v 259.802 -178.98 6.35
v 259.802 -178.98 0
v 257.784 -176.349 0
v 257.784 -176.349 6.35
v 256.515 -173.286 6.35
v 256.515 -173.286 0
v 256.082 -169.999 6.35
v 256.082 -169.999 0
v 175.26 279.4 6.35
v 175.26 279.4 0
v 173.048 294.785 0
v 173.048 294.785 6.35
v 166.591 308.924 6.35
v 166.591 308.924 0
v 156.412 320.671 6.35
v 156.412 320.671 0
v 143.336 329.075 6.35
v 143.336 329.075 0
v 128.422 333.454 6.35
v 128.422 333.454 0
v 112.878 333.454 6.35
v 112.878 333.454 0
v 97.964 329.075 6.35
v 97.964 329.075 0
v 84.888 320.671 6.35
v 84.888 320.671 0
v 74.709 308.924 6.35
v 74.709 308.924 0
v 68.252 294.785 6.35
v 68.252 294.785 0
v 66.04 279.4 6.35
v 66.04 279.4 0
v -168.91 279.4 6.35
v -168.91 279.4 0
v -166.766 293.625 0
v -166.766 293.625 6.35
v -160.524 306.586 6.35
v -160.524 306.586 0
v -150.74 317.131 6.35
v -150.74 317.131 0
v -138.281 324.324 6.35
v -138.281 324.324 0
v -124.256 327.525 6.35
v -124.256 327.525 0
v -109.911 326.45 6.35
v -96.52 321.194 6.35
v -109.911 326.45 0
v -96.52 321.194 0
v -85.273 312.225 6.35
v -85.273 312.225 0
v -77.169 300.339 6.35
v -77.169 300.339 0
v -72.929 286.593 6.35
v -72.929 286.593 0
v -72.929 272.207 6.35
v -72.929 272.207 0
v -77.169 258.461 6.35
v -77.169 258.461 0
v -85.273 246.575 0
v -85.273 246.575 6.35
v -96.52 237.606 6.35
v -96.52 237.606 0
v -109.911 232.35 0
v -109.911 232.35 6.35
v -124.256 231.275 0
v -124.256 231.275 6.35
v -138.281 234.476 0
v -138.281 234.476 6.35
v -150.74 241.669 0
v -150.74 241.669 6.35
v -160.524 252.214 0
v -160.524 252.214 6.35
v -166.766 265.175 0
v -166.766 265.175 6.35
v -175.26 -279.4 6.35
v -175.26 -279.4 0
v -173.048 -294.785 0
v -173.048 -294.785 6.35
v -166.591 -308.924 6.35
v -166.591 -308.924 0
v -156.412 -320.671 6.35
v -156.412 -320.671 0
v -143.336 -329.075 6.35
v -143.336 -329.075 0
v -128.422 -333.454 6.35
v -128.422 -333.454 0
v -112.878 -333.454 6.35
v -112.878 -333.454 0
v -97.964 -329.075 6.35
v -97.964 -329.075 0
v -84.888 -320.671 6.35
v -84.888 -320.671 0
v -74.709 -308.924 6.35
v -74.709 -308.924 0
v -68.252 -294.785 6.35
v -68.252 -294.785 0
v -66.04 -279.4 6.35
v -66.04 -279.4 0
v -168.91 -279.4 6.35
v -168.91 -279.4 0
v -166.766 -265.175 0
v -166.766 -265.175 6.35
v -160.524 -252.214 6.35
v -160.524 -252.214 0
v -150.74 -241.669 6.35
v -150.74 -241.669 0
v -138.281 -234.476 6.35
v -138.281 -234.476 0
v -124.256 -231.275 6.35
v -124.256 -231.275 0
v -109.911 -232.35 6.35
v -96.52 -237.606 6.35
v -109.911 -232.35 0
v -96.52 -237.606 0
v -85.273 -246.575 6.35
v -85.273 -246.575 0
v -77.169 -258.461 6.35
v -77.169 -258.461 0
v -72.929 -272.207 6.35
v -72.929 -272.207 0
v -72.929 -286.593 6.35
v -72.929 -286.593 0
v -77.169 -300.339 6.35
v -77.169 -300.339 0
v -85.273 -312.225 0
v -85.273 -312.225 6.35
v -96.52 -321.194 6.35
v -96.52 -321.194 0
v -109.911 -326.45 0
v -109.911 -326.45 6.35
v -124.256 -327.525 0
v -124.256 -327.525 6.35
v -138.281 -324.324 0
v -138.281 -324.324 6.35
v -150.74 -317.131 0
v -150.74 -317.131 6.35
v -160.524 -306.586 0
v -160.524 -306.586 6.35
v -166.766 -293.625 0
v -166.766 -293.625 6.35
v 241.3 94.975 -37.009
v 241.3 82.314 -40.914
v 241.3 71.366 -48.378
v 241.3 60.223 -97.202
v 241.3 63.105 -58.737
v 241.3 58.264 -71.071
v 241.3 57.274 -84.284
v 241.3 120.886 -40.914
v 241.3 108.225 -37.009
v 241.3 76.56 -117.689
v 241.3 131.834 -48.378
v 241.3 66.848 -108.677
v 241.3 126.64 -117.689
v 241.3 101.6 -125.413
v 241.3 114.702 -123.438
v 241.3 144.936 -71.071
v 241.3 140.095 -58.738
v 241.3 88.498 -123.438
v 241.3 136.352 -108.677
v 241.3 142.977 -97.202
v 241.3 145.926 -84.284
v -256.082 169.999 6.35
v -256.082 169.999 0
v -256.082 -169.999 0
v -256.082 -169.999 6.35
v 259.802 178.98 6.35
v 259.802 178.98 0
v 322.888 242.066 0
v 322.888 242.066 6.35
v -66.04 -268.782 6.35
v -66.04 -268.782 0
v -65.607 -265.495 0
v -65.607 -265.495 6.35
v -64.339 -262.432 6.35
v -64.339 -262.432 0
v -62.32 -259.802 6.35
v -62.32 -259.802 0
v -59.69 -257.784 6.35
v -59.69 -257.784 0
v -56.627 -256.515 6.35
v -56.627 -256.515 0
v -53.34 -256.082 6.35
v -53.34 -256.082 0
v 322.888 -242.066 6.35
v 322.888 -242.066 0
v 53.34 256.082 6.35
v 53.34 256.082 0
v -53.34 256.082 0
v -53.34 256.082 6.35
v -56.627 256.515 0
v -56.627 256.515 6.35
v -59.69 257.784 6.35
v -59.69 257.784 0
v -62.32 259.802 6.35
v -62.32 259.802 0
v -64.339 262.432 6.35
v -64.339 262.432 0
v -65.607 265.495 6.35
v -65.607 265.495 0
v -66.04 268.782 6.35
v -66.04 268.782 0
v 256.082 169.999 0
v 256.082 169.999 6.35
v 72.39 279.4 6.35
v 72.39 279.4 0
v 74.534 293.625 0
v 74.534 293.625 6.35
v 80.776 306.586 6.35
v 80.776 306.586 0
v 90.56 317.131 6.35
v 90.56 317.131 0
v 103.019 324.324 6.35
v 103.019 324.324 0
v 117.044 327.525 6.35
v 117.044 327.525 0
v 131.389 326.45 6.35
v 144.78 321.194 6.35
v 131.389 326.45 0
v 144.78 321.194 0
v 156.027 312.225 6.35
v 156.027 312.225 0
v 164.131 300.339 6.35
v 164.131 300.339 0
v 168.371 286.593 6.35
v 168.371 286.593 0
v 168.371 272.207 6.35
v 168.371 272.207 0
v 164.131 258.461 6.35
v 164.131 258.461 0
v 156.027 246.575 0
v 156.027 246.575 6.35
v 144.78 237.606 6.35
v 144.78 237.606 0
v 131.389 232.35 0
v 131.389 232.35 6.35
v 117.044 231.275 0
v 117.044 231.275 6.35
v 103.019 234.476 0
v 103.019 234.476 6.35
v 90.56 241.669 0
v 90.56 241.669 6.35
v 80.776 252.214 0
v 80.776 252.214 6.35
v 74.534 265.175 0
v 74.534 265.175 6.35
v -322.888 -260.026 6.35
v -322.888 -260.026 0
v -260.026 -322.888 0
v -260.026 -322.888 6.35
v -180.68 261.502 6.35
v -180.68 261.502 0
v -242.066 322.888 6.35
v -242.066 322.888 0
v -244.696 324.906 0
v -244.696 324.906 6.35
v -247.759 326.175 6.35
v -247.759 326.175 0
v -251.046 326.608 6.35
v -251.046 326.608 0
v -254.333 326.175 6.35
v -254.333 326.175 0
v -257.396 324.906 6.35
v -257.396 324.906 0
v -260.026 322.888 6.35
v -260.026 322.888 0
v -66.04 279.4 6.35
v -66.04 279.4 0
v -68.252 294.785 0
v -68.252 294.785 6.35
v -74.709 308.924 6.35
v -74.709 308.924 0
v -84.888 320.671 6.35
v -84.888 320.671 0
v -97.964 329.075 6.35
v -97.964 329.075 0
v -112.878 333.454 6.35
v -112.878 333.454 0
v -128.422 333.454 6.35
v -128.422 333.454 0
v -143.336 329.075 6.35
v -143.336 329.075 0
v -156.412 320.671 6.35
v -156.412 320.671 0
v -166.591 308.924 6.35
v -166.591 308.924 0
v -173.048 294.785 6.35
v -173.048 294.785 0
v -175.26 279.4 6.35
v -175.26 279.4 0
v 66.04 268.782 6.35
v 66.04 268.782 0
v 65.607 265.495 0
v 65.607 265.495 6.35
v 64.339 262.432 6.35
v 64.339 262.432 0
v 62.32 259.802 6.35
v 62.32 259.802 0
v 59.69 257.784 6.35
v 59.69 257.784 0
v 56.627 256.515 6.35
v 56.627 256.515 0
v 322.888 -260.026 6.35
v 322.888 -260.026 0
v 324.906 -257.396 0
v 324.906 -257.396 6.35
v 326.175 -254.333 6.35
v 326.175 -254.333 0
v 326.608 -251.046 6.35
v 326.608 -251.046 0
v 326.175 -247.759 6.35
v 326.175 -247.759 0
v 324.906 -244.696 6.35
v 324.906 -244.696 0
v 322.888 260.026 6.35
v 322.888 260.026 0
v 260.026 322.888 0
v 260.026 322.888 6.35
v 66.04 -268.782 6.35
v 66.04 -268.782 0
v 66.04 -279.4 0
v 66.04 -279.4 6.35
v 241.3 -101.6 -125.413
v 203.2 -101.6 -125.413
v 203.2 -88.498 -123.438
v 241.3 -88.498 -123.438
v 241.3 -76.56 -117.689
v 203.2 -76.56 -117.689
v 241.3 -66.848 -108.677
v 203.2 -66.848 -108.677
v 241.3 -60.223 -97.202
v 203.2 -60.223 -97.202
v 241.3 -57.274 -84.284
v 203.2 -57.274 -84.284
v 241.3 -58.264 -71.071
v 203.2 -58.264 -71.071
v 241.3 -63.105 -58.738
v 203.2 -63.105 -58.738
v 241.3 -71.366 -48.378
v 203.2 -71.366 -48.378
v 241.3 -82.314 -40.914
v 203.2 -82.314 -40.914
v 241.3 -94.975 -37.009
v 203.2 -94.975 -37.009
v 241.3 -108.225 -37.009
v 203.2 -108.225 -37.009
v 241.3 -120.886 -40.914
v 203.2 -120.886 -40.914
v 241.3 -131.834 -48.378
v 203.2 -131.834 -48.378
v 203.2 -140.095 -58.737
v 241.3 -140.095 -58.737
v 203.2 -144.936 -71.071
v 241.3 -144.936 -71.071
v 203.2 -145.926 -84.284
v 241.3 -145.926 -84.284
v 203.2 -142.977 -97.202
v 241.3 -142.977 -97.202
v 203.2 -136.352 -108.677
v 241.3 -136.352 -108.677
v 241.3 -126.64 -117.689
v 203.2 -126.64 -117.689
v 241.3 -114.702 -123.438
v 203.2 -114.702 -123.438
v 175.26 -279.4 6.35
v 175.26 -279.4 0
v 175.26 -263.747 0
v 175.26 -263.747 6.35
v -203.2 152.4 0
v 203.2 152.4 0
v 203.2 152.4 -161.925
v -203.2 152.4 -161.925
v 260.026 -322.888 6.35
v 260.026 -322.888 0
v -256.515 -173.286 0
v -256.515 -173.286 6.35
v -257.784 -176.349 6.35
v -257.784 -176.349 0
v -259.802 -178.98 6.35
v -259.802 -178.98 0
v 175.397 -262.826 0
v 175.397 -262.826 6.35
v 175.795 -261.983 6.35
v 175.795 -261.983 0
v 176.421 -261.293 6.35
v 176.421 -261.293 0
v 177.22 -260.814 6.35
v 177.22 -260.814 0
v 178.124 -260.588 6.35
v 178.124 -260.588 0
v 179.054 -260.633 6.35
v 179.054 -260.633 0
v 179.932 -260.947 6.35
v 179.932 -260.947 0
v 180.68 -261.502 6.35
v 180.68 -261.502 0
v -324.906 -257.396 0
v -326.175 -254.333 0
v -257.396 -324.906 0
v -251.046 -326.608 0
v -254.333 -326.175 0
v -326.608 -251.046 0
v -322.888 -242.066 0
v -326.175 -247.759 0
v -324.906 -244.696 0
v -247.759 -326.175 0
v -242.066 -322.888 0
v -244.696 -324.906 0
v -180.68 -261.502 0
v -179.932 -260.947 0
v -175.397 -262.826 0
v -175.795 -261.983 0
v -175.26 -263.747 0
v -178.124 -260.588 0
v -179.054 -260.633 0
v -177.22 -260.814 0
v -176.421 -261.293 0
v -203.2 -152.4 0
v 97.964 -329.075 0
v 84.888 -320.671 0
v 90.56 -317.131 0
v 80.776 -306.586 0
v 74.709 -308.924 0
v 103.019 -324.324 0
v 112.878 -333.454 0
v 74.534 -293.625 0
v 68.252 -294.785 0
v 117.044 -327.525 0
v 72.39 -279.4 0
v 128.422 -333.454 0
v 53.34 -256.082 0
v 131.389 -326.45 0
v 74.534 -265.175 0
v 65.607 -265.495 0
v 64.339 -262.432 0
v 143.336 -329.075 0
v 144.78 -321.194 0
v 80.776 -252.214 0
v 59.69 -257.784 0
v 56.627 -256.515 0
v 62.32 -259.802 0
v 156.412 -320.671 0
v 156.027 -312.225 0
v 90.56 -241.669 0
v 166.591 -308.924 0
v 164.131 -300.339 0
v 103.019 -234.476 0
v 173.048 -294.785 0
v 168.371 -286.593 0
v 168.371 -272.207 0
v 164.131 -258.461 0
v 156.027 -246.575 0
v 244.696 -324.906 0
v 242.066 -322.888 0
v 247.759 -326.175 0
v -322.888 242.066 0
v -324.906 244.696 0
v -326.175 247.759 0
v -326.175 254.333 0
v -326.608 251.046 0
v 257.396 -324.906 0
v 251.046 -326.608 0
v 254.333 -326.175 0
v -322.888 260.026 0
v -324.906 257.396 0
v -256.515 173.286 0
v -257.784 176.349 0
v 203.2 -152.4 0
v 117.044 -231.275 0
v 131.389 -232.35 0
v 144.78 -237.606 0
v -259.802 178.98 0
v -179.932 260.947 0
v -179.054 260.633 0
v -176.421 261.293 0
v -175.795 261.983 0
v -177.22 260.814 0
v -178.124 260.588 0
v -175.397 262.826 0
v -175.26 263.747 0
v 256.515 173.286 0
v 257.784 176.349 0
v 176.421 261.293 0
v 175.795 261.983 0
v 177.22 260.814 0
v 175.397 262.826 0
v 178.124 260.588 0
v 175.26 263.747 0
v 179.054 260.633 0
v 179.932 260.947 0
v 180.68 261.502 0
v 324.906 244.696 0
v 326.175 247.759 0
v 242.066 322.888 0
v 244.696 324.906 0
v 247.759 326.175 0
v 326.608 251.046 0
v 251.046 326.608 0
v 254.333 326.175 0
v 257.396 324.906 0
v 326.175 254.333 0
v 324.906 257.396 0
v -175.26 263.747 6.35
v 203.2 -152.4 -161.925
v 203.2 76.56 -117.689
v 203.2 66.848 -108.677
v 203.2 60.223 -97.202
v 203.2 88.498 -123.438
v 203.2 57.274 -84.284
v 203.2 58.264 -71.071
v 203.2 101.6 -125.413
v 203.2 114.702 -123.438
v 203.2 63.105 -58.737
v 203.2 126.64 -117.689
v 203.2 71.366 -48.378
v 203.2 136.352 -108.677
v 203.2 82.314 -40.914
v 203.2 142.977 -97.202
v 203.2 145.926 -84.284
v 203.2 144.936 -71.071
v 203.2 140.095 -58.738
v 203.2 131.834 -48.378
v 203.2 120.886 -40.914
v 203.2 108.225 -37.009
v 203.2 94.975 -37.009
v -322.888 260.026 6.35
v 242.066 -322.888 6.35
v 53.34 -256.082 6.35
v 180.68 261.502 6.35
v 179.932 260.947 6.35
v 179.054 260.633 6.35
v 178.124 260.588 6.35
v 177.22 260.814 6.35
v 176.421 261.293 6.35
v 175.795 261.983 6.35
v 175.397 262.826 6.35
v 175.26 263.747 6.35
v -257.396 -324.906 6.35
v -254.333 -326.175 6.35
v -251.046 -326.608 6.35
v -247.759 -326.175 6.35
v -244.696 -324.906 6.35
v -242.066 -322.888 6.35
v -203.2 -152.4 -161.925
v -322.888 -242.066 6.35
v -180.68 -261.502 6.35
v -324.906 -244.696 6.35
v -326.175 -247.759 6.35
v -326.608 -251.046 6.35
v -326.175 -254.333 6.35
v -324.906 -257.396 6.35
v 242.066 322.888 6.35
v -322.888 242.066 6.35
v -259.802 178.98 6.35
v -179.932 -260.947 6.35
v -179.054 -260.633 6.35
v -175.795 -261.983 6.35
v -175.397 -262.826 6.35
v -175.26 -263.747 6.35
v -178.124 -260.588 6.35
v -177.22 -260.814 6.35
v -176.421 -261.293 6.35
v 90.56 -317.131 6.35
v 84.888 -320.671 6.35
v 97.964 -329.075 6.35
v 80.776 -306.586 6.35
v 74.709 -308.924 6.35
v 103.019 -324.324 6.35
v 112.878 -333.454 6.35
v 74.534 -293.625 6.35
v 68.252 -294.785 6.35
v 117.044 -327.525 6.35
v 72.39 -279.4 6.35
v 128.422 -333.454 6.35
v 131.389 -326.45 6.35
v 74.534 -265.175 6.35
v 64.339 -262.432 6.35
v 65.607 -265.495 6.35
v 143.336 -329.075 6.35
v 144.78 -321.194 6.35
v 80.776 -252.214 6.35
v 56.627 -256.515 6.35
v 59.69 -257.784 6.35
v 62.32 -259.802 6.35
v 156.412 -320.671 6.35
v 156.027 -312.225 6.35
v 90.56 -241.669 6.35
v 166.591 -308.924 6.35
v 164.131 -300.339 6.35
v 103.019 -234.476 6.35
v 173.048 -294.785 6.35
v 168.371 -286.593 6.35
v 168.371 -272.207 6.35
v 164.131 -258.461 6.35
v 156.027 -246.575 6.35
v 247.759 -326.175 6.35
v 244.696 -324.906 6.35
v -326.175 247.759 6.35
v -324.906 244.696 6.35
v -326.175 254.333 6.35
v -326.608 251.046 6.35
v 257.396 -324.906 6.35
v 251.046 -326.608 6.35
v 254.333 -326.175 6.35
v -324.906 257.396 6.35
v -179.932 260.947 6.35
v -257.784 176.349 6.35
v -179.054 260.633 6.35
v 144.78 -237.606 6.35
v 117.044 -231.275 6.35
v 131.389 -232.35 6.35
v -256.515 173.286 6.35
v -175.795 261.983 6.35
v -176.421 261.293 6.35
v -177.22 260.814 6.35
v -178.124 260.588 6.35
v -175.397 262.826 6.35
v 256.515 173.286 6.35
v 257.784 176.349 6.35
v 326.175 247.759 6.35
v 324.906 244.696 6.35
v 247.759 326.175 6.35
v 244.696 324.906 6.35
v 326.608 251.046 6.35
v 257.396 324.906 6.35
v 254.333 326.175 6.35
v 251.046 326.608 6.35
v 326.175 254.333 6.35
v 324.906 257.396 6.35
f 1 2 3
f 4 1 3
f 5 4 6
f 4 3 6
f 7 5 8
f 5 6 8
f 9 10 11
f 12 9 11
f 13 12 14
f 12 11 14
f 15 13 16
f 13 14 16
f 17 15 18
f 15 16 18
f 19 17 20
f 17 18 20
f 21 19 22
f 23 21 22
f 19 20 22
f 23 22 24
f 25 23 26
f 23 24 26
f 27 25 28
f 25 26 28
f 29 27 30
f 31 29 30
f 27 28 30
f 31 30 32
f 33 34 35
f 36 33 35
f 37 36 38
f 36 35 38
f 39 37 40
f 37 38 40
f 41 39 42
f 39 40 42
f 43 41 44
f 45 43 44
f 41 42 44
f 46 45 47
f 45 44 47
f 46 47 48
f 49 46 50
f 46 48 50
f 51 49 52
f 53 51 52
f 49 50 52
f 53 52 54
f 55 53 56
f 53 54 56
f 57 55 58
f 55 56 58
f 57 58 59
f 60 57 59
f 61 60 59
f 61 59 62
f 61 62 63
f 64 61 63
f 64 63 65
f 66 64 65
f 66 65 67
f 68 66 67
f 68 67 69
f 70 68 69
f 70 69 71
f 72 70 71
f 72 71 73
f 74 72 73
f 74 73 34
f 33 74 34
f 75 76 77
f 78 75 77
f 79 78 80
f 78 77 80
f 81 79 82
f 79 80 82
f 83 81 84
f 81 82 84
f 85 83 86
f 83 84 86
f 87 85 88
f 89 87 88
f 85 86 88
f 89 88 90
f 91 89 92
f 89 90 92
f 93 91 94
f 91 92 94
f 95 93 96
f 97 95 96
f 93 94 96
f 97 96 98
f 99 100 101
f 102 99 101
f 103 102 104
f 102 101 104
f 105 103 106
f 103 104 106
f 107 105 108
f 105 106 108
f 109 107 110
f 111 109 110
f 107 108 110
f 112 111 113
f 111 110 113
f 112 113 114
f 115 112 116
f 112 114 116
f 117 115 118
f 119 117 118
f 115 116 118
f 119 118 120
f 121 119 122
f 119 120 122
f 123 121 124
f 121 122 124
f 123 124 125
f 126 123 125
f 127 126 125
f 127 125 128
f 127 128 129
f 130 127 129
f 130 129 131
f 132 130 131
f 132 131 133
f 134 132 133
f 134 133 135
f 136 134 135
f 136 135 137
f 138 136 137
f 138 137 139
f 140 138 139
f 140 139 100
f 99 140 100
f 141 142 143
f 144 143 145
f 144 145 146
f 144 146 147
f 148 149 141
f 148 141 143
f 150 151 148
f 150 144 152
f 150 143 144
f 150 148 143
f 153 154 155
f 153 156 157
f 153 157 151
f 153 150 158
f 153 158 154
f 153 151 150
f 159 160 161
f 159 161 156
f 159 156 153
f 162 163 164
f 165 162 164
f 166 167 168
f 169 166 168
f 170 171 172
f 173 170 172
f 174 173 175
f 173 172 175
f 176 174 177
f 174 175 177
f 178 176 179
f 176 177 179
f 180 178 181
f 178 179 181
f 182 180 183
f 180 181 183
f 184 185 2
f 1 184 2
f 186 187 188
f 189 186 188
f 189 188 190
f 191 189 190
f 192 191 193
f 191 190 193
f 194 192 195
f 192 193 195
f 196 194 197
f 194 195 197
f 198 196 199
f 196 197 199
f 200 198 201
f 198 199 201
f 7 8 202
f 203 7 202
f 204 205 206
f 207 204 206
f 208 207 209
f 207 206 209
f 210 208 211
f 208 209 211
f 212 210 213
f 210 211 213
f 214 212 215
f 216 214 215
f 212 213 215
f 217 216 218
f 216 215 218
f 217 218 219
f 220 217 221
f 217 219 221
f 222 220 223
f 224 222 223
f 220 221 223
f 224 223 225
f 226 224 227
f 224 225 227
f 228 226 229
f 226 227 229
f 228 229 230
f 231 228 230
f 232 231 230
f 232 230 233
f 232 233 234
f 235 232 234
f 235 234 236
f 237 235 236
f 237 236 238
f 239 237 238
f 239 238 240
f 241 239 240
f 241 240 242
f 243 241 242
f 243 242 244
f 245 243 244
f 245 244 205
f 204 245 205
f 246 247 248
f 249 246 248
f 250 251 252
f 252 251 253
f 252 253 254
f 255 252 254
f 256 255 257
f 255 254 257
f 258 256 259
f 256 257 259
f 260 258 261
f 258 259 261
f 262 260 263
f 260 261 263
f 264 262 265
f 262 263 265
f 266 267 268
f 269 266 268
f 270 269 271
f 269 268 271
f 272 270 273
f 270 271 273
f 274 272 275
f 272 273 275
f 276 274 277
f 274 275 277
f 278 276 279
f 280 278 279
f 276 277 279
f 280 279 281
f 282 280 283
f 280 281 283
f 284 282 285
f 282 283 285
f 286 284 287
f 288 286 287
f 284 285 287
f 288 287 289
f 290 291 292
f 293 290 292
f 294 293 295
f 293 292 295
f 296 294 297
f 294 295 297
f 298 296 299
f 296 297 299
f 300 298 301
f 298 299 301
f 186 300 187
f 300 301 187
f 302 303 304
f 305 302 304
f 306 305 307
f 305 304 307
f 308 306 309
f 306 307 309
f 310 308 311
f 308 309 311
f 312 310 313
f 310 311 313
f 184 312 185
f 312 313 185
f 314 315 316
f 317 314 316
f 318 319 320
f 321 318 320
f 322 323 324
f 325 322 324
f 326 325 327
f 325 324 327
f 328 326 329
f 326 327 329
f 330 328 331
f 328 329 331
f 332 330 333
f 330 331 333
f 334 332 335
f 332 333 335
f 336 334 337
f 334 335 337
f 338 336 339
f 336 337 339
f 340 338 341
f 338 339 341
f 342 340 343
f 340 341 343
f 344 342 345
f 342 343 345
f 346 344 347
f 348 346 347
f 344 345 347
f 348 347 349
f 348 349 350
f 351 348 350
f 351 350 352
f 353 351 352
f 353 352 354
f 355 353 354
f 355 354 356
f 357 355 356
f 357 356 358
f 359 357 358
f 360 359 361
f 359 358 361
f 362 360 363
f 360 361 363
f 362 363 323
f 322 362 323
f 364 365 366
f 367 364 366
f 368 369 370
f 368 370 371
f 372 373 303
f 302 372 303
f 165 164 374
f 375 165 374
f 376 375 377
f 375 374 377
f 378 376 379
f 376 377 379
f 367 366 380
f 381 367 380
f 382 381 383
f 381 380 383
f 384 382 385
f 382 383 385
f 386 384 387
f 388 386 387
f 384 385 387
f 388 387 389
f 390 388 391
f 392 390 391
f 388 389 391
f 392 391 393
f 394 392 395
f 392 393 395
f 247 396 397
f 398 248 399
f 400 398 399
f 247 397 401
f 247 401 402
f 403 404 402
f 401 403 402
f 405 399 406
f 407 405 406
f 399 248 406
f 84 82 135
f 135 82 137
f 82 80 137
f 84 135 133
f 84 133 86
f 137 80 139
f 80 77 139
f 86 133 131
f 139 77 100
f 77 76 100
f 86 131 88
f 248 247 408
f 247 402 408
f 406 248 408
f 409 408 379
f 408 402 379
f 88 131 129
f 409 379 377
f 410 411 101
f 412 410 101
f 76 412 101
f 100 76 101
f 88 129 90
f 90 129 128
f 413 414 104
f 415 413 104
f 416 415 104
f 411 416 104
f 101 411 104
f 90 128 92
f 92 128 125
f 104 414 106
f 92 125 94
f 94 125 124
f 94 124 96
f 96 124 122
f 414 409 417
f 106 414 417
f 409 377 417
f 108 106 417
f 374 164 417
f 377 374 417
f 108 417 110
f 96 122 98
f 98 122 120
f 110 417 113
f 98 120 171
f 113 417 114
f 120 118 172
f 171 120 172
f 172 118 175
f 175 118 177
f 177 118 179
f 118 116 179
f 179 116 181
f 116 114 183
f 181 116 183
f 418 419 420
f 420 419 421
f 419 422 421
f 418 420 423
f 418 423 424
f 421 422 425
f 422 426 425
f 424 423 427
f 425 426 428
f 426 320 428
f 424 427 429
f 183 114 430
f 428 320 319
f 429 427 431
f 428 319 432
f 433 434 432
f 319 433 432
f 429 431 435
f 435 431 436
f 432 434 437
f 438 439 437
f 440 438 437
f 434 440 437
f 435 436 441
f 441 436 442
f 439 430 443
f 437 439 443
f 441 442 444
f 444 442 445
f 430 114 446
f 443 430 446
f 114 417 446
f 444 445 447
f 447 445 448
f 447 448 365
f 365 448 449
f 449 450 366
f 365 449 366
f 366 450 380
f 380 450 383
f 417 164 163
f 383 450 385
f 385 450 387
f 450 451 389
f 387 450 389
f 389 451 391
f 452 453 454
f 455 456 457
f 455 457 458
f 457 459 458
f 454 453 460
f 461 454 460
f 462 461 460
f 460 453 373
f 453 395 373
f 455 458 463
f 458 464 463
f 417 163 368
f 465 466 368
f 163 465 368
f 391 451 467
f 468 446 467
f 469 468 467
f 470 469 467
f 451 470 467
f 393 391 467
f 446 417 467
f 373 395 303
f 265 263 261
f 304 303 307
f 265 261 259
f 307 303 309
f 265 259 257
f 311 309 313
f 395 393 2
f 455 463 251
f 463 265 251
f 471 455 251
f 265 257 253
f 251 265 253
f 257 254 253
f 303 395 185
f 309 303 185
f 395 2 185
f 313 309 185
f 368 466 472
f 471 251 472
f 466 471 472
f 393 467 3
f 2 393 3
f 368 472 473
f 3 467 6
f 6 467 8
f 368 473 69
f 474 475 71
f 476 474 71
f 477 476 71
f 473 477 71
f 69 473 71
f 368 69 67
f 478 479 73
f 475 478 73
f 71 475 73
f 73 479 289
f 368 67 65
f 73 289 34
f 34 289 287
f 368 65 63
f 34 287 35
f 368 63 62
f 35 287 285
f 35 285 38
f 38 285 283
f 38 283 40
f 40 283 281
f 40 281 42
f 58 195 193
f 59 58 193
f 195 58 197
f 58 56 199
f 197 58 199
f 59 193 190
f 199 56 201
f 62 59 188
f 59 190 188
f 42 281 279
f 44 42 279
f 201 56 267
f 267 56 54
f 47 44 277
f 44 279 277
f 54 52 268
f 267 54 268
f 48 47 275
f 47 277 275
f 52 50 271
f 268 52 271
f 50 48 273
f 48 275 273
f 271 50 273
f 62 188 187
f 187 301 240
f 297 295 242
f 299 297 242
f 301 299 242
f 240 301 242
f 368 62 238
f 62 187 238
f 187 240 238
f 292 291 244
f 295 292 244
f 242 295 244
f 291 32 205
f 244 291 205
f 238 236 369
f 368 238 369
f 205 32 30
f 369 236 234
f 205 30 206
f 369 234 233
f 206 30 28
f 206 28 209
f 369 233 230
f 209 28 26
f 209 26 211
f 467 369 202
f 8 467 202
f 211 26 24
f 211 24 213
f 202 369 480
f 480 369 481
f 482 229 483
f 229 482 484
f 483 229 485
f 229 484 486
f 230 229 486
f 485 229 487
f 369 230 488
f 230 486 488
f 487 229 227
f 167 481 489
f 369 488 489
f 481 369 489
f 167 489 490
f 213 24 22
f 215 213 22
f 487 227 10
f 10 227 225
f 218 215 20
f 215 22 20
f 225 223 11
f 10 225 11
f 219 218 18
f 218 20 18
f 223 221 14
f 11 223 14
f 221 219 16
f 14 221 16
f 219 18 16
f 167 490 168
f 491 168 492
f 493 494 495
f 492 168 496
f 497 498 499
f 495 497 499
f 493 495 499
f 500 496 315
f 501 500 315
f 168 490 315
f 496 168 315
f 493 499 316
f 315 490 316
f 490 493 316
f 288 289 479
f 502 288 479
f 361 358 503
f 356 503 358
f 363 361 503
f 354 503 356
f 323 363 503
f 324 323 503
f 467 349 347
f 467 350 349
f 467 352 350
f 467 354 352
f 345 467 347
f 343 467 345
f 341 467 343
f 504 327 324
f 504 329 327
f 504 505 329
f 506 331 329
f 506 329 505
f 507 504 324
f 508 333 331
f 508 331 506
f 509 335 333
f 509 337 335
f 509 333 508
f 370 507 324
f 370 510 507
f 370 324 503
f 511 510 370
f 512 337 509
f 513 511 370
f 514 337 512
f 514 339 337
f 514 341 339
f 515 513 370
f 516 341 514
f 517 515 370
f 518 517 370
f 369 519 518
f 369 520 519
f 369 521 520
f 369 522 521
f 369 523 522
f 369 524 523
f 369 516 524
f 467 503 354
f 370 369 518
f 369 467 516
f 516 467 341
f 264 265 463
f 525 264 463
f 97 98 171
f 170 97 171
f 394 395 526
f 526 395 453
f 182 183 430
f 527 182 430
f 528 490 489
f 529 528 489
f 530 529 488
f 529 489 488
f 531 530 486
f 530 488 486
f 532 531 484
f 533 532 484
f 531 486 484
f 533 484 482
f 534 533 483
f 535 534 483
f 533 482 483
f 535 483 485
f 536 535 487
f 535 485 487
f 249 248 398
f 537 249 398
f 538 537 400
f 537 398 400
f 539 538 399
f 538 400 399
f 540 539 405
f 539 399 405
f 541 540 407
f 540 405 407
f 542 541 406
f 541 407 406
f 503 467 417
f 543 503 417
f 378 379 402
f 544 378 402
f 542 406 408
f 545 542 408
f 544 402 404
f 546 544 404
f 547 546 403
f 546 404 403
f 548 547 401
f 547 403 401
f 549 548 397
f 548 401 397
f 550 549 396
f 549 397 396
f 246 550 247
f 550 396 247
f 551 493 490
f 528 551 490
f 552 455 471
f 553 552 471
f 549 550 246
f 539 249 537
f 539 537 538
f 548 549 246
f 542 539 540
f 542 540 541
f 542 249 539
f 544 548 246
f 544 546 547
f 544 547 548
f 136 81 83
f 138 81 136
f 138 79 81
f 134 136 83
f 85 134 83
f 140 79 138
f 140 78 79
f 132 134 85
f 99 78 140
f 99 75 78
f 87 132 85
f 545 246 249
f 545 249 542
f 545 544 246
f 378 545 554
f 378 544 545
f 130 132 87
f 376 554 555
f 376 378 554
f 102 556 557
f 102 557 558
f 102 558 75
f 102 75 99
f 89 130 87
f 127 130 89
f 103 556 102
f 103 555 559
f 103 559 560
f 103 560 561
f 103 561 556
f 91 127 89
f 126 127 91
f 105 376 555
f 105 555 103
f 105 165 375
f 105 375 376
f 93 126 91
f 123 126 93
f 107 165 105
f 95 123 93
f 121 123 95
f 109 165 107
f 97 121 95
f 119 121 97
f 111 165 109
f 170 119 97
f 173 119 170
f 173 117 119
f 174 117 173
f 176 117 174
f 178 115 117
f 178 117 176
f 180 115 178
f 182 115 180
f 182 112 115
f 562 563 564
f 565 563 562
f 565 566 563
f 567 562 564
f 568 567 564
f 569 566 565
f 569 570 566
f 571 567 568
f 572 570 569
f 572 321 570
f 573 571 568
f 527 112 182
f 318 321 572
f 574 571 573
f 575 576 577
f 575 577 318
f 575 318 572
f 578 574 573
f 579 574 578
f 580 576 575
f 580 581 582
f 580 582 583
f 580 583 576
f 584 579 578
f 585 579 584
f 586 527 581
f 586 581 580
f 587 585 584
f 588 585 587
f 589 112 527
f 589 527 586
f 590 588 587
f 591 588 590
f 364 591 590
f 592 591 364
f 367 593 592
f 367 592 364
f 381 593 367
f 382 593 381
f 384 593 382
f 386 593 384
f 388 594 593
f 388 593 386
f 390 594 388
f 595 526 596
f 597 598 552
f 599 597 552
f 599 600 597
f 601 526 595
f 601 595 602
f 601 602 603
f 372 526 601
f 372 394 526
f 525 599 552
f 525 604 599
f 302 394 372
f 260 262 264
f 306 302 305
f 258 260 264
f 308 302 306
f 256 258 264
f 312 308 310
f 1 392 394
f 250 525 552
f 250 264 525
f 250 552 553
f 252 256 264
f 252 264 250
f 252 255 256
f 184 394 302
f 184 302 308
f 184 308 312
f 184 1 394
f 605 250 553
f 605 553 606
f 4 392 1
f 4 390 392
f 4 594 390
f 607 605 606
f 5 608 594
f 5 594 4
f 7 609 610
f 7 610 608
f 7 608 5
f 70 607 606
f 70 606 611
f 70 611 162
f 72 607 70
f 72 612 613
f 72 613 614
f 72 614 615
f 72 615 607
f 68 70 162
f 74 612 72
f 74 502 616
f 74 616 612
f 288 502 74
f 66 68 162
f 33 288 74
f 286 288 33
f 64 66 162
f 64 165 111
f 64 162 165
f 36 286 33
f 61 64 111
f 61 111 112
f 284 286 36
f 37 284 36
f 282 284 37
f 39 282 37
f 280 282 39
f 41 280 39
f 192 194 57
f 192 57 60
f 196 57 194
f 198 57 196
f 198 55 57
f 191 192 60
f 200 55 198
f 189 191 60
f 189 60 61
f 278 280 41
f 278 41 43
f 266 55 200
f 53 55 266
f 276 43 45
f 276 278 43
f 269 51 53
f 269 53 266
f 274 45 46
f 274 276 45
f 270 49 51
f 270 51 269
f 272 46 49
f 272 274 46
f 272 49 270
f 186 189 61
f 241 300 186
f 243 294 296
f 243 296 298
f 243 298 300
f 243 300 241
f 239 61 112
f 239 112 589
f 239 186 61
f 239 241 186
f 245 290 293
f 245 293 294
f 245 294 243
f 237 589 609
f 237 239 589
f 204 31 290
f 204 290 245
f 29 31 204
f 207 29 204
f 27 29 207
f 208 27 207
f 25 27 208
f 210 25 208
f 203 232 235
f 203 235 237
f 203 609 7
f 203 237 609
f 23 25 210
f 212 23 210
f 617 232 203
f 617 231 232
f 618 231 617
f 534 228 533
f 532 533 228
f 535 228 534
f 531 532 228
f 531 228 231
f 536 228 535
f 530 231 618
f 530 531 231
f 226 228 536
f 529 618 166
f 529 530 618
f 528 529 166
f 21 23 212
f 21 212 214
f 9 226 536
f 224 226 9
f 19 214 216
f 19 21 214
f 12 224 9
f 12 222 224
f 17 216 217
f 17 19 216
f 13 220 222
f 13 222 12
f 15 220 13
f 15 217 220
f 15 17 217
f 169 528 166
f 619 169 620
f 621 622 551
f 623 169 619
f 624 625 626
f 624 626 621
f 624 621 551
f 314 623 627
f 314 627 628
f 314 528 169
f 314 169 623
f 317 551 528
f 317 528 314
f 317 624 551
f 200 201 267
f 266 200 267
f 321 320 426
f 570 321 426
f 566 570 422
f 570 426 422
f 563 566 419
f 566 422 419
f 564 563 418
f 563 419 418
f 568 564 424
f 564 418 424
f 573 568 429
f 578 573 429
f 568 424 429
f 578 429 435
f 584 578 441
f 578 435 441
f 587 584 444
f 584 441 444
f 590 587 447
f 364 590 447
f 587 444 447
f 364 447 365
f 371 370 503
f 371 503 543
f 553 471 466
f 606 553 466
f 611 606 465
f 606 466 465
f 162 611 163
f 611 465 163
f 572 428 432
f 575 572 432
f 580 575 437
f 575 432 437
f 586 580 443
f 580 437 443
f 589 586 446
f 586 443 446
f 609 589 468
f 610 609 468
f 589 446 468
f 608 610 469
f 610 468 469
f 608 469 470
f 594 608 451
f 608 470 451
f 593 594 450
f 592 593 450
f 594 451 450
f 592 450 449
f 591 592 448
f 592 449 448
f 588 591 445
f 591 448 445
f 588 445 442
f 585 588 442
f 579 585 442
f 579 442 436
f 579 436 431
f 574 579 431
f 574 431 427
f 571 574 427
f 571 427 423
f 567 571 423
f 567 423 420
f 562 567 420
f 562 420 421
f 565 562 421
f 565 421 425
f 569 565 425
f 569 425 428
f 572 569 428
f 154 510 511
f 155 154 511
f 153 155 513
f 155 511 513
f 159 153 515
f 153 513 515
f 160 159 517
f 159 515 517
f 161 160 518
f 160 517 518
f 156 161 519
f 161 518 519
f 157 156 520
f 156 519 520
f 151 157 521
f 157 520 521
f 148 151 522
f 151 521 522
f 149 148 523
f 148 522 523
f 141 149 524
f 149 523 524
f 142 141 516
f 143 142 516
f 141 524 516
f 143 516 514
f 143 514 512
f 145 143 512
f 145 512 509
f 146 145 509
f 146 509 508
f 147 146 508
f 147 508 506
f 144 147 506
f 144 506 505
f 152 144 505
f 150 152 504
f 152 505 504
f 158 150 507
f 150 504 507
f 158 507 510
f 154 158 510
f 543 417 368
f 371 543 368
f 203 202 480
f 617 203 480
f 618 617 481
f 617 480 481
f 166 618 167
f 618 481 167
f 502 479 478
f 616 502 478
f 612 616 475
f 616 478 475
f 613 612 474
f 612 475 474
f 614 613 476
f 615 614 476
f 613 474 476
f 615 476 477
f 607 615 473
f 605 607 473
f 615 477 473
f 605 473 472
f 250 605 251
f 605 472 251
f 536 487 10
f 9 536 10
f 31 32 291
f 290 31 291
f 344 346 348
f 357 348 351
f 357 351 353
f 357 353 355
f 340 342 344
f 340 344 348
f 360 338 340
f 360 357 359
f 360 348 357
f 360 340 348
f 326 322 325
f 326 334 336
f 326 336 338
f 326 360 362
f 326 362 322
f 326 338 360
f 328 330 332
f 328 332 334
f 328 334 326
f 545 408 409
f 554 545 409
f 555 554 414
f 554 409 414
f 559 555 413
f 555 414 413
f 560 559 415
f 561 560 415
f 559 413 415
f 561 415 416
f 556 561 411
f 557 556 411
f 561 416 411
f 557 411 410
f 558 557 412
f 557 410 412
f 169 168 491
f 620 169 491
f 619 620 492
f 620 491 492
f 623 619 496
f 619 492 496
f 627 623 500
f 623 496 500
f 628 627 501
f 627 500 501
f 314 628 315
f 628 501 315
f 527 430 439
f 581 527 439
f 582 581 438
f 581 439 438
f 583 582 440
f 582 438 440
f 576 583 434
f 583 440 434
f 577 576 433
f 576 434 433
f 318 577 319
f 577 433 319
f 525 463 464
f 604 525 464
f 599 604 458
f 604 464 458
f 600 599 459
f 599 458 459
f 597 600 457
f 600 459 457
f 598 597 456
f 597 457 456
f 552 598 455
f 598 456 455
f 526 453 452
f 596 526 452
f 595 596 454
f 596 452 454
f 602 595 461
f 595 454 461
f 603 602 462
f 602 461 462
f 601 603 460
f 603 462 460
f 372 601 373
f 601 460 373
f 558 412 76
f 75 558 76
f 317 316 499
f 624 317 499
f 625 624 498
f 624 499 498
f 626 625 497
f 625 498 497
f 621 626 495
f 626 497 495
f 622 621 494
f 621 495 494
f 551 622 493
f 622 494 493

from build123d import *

# Parameters (mm, degrees)
BOSS_EXTRUDE1_DEPTH = 6.35
SKETCH2_W           = 406.4
SKETCH2_H           = 304.8
BOSS_EXTRUDE2_DEPTH = 161.925
SKETCH3_R           = 48.26
CUT_EXTRUDE1_DEPTH  = 161.925
SKETCH4_R           = 44.45
BOSS_EXTRUDE3_DEPTH = 38.1


with BuildPart() as part:
    # Sketch1 → Boss-Extrude1 (new body)
    with BuildSketch(Plane.XY):
        with BuildLine():
            Line((256.082305134, -169.999487802), (256.082305134, 169.999487802))
            ThreePointArc((256.082305134, 169.999487802), (257.049035071, 174.859567393), (259.802049013, 178.979743923))
            Line((259.802049013, 178.979743923), (322.888153673, 242.065848583))
            ThreePointArc((322.888153673, 242.065848583), (326.607897552, 251.046104704), (322.888153673, 260.026360825))
            Line((322.888153673, 260.026360825), (260.026360825, 322.888153673))
            ThreePointArc((260.026360825, 322.888153673), (251.046104704, 326.607897552), (242.065848583, 322.888153673))
            Line((242.065848583, 322.888153673), (180.680064074, 261.502369164))
            ThreePointArc((180.680064074, 261.502369164), (177.219980146, 260.814115678), (175.260000044, 263.747433194))
            Line((175.260000044, 263.747433194), (175.260000044, 279.4))
            ThreePointArc((175.260000044, 279.4), (120.65, 334.010000044), (66.039999956, 279.4))
            Line((66.039999956, 279.4), (66.039999956, 268.782305134))
            ThreePointArc((66.039999956, 268.782305134), (62.320256077, 259.802049013), (53.339999956, 256.082305134))
            Line((53.339999956, 256.082305134), (-53.339999956, 256.082305134))
            ThreePointArc((-53.339999956, 256.082305134), (-62.320256077, 259.802049013), (-66.039999956, 268.782305134))
            Line((-66.039999956, 268.782305134), (-66.039999956, 279.4))
            ThreePointArc((-66.039999956, 279.4), (-120.65, 334.010000044), (-175.260000044, 279.4))
            Line((-175.260000044, 279.4), (-175.260000044, 263.747433194))
            ThreePointArc((-175.260000044, 263.747433194), (-177.219980146, 260.814115678), (-180.680064074, 261.502369164))
            Line((-180.680064074, 261.502369164), (-242.065848583, 322.888153673))
            ThreePointArc((-242.065848583, 322.888153673), (-251.046104704, 326.607897552), (-260.026360825, 322.888153673))
            Line((-260.026360825, 322.888153673), (-322.888153673, 260.026360825))
            ThreePointArc((-322.888153673, 260.026360825), (-326.607897552, 251.046104704), (-322.888153673, 242.065848583))
            Line((-322.888153673, 242.065848583), (-259.802049013, 178.979743923))
            ThreePointArc((-259.802049013, 178.979743923), (-257.049035071, 174.859567393), (-256.082305134, 169.999487802))
            Line((-256.082305134, 169.999487802), (-256.082305134, -169.999487802))
            ThreePointArc((-256.082305134, -169.999487802), (-257.049035071, -174.859567393), (-259.802049013, -178.979743923))
            Line((-259.802049013, -178.979743923), (-322.888153673, -242.065848583))
            ThreePointArc((-322.888153673, -242.065848583), (-326.607897552, -251.046104704), (-322.888153673, -260.026360825))
            Line((-322.888153673, -260.026360825), (-260.026360825, -322.888153673))
            ThreePointArc((-260.026360825, -322.888153673), (-251.046104704, -326.607897552), (-242.065848583, -322.888153673))
            Line((-242.065848583, -322.888153673), (-180.680064074, -261.502369164))
            ThreePointArc((-180.680064074, -261.502369164), (-177.219980146, -260.814115678), (-175.260000044, -263.747433194))
            Line((-175.260000044, -263.747433194), (-175.260000044, -279.4))
            ThreePointArc((-175.260000044, -279.4), (-120.65, -334.010000044), (-66.039999956, -279.4))
            Line((-66.039999956, -279.4), (-66.039999956, -268.782305134))
            ThreePointArc((-66.039999956, -268.782305134), (-62.320256077, -259.802049013), (-53.339999956, -256.082305134))
            Line((-53.339999956, -256.082305134), (53.339999956, -256.082305134))
            ThreePointArc((53.339999956, -256.082305134), (62.320256077, -259.802049013), (66.039999956, -268.782305134))
            Line((66.039999956, -268.782305134), (66.039999956, -279.4))
            ThreePointArc((66.039999956, -279.4), (120.65, -334.010000044), (175.260000044, -279.4))
            Line((175.260000044, -279.4), (175.260000044, -263.747433194))
            ThreePointArc((175.260000044, -263.747433194), (177.219980146, -260.814115678), (180.680064074, -261.502369164))
            Line((180.680064074, -261.502369164), (242.065848583, -322.888153673))
            ThreePointArc((242.065848583, -322.888153673), (251.046104704, -326.607897552), (260.026360825, -322.888153673))
            Line((260.026360825, -322.888153673), (322.888153673, -260.026360825))
            ThreePointArc((322.888153673, -260.026360825), (326.607897552, -251.046104704), (322.888153673, -242.065848583))
            Line((322.888153673, -242.065848583), (259.802049013, -178.979743923))
            ThreePointArc((259.802049013, -178.979743923), (257.049035071, -174.859567393), (256.082305134, -169.999487802))
        make_face()
    extrude(amount=BOSS_EXTRUDE1_DEPTH)

    # Sketch2 → Boss-Extrude2 (add)
    with BuildSketch(Plane(origin=(0, 0, 0), x_dir=(-1, 0, 0), z_dir=(0, 0, -1))):
        Rectangle(SKETCH2_W, SKETCH2_H)
    extrude(amount=BOSS_EXTRUDE2_DEPTH)

    # Sketch3 → Cut-Extrude1 (cut)
    with BuildSketch(Plane(origin=(0, 0, 0), x_dir=(-1, 0, 0), z_dir=(0, 0, -1))):
        with Locations((120.65, 279.4)):
            Circle(SKETCH3_R)
        with Locations((-120.65, 279.4)):
            Circle(SKETCH3_R)
        with Locations((-120.65, -279.4)):
            Circle(SKETCH3_R)
        with Locations((120.65, -279.4)):
            Circle(SKETCH3_R)
    extrude(amount=-CUT_EXTRUDE1_DEPTH, mode=Mode.SUBTRACT)

    # Sketch4 → Boss-Extrude3 (add)
    with BuildSketch(Plane(origin=(203.2, 0, 0), x_dir=(0, 0, -1), z_dir=(1, 0, 0))):
        with Locations((80.9625, 101.6)):
            Circle(SKETCH4_R)
        with Locations((80.9625, -101.6)):
            Circle(SKETCH4_R)
    extrude(amount=BOSS_EXTRUDE3_DEPTH)


solid = part.part
